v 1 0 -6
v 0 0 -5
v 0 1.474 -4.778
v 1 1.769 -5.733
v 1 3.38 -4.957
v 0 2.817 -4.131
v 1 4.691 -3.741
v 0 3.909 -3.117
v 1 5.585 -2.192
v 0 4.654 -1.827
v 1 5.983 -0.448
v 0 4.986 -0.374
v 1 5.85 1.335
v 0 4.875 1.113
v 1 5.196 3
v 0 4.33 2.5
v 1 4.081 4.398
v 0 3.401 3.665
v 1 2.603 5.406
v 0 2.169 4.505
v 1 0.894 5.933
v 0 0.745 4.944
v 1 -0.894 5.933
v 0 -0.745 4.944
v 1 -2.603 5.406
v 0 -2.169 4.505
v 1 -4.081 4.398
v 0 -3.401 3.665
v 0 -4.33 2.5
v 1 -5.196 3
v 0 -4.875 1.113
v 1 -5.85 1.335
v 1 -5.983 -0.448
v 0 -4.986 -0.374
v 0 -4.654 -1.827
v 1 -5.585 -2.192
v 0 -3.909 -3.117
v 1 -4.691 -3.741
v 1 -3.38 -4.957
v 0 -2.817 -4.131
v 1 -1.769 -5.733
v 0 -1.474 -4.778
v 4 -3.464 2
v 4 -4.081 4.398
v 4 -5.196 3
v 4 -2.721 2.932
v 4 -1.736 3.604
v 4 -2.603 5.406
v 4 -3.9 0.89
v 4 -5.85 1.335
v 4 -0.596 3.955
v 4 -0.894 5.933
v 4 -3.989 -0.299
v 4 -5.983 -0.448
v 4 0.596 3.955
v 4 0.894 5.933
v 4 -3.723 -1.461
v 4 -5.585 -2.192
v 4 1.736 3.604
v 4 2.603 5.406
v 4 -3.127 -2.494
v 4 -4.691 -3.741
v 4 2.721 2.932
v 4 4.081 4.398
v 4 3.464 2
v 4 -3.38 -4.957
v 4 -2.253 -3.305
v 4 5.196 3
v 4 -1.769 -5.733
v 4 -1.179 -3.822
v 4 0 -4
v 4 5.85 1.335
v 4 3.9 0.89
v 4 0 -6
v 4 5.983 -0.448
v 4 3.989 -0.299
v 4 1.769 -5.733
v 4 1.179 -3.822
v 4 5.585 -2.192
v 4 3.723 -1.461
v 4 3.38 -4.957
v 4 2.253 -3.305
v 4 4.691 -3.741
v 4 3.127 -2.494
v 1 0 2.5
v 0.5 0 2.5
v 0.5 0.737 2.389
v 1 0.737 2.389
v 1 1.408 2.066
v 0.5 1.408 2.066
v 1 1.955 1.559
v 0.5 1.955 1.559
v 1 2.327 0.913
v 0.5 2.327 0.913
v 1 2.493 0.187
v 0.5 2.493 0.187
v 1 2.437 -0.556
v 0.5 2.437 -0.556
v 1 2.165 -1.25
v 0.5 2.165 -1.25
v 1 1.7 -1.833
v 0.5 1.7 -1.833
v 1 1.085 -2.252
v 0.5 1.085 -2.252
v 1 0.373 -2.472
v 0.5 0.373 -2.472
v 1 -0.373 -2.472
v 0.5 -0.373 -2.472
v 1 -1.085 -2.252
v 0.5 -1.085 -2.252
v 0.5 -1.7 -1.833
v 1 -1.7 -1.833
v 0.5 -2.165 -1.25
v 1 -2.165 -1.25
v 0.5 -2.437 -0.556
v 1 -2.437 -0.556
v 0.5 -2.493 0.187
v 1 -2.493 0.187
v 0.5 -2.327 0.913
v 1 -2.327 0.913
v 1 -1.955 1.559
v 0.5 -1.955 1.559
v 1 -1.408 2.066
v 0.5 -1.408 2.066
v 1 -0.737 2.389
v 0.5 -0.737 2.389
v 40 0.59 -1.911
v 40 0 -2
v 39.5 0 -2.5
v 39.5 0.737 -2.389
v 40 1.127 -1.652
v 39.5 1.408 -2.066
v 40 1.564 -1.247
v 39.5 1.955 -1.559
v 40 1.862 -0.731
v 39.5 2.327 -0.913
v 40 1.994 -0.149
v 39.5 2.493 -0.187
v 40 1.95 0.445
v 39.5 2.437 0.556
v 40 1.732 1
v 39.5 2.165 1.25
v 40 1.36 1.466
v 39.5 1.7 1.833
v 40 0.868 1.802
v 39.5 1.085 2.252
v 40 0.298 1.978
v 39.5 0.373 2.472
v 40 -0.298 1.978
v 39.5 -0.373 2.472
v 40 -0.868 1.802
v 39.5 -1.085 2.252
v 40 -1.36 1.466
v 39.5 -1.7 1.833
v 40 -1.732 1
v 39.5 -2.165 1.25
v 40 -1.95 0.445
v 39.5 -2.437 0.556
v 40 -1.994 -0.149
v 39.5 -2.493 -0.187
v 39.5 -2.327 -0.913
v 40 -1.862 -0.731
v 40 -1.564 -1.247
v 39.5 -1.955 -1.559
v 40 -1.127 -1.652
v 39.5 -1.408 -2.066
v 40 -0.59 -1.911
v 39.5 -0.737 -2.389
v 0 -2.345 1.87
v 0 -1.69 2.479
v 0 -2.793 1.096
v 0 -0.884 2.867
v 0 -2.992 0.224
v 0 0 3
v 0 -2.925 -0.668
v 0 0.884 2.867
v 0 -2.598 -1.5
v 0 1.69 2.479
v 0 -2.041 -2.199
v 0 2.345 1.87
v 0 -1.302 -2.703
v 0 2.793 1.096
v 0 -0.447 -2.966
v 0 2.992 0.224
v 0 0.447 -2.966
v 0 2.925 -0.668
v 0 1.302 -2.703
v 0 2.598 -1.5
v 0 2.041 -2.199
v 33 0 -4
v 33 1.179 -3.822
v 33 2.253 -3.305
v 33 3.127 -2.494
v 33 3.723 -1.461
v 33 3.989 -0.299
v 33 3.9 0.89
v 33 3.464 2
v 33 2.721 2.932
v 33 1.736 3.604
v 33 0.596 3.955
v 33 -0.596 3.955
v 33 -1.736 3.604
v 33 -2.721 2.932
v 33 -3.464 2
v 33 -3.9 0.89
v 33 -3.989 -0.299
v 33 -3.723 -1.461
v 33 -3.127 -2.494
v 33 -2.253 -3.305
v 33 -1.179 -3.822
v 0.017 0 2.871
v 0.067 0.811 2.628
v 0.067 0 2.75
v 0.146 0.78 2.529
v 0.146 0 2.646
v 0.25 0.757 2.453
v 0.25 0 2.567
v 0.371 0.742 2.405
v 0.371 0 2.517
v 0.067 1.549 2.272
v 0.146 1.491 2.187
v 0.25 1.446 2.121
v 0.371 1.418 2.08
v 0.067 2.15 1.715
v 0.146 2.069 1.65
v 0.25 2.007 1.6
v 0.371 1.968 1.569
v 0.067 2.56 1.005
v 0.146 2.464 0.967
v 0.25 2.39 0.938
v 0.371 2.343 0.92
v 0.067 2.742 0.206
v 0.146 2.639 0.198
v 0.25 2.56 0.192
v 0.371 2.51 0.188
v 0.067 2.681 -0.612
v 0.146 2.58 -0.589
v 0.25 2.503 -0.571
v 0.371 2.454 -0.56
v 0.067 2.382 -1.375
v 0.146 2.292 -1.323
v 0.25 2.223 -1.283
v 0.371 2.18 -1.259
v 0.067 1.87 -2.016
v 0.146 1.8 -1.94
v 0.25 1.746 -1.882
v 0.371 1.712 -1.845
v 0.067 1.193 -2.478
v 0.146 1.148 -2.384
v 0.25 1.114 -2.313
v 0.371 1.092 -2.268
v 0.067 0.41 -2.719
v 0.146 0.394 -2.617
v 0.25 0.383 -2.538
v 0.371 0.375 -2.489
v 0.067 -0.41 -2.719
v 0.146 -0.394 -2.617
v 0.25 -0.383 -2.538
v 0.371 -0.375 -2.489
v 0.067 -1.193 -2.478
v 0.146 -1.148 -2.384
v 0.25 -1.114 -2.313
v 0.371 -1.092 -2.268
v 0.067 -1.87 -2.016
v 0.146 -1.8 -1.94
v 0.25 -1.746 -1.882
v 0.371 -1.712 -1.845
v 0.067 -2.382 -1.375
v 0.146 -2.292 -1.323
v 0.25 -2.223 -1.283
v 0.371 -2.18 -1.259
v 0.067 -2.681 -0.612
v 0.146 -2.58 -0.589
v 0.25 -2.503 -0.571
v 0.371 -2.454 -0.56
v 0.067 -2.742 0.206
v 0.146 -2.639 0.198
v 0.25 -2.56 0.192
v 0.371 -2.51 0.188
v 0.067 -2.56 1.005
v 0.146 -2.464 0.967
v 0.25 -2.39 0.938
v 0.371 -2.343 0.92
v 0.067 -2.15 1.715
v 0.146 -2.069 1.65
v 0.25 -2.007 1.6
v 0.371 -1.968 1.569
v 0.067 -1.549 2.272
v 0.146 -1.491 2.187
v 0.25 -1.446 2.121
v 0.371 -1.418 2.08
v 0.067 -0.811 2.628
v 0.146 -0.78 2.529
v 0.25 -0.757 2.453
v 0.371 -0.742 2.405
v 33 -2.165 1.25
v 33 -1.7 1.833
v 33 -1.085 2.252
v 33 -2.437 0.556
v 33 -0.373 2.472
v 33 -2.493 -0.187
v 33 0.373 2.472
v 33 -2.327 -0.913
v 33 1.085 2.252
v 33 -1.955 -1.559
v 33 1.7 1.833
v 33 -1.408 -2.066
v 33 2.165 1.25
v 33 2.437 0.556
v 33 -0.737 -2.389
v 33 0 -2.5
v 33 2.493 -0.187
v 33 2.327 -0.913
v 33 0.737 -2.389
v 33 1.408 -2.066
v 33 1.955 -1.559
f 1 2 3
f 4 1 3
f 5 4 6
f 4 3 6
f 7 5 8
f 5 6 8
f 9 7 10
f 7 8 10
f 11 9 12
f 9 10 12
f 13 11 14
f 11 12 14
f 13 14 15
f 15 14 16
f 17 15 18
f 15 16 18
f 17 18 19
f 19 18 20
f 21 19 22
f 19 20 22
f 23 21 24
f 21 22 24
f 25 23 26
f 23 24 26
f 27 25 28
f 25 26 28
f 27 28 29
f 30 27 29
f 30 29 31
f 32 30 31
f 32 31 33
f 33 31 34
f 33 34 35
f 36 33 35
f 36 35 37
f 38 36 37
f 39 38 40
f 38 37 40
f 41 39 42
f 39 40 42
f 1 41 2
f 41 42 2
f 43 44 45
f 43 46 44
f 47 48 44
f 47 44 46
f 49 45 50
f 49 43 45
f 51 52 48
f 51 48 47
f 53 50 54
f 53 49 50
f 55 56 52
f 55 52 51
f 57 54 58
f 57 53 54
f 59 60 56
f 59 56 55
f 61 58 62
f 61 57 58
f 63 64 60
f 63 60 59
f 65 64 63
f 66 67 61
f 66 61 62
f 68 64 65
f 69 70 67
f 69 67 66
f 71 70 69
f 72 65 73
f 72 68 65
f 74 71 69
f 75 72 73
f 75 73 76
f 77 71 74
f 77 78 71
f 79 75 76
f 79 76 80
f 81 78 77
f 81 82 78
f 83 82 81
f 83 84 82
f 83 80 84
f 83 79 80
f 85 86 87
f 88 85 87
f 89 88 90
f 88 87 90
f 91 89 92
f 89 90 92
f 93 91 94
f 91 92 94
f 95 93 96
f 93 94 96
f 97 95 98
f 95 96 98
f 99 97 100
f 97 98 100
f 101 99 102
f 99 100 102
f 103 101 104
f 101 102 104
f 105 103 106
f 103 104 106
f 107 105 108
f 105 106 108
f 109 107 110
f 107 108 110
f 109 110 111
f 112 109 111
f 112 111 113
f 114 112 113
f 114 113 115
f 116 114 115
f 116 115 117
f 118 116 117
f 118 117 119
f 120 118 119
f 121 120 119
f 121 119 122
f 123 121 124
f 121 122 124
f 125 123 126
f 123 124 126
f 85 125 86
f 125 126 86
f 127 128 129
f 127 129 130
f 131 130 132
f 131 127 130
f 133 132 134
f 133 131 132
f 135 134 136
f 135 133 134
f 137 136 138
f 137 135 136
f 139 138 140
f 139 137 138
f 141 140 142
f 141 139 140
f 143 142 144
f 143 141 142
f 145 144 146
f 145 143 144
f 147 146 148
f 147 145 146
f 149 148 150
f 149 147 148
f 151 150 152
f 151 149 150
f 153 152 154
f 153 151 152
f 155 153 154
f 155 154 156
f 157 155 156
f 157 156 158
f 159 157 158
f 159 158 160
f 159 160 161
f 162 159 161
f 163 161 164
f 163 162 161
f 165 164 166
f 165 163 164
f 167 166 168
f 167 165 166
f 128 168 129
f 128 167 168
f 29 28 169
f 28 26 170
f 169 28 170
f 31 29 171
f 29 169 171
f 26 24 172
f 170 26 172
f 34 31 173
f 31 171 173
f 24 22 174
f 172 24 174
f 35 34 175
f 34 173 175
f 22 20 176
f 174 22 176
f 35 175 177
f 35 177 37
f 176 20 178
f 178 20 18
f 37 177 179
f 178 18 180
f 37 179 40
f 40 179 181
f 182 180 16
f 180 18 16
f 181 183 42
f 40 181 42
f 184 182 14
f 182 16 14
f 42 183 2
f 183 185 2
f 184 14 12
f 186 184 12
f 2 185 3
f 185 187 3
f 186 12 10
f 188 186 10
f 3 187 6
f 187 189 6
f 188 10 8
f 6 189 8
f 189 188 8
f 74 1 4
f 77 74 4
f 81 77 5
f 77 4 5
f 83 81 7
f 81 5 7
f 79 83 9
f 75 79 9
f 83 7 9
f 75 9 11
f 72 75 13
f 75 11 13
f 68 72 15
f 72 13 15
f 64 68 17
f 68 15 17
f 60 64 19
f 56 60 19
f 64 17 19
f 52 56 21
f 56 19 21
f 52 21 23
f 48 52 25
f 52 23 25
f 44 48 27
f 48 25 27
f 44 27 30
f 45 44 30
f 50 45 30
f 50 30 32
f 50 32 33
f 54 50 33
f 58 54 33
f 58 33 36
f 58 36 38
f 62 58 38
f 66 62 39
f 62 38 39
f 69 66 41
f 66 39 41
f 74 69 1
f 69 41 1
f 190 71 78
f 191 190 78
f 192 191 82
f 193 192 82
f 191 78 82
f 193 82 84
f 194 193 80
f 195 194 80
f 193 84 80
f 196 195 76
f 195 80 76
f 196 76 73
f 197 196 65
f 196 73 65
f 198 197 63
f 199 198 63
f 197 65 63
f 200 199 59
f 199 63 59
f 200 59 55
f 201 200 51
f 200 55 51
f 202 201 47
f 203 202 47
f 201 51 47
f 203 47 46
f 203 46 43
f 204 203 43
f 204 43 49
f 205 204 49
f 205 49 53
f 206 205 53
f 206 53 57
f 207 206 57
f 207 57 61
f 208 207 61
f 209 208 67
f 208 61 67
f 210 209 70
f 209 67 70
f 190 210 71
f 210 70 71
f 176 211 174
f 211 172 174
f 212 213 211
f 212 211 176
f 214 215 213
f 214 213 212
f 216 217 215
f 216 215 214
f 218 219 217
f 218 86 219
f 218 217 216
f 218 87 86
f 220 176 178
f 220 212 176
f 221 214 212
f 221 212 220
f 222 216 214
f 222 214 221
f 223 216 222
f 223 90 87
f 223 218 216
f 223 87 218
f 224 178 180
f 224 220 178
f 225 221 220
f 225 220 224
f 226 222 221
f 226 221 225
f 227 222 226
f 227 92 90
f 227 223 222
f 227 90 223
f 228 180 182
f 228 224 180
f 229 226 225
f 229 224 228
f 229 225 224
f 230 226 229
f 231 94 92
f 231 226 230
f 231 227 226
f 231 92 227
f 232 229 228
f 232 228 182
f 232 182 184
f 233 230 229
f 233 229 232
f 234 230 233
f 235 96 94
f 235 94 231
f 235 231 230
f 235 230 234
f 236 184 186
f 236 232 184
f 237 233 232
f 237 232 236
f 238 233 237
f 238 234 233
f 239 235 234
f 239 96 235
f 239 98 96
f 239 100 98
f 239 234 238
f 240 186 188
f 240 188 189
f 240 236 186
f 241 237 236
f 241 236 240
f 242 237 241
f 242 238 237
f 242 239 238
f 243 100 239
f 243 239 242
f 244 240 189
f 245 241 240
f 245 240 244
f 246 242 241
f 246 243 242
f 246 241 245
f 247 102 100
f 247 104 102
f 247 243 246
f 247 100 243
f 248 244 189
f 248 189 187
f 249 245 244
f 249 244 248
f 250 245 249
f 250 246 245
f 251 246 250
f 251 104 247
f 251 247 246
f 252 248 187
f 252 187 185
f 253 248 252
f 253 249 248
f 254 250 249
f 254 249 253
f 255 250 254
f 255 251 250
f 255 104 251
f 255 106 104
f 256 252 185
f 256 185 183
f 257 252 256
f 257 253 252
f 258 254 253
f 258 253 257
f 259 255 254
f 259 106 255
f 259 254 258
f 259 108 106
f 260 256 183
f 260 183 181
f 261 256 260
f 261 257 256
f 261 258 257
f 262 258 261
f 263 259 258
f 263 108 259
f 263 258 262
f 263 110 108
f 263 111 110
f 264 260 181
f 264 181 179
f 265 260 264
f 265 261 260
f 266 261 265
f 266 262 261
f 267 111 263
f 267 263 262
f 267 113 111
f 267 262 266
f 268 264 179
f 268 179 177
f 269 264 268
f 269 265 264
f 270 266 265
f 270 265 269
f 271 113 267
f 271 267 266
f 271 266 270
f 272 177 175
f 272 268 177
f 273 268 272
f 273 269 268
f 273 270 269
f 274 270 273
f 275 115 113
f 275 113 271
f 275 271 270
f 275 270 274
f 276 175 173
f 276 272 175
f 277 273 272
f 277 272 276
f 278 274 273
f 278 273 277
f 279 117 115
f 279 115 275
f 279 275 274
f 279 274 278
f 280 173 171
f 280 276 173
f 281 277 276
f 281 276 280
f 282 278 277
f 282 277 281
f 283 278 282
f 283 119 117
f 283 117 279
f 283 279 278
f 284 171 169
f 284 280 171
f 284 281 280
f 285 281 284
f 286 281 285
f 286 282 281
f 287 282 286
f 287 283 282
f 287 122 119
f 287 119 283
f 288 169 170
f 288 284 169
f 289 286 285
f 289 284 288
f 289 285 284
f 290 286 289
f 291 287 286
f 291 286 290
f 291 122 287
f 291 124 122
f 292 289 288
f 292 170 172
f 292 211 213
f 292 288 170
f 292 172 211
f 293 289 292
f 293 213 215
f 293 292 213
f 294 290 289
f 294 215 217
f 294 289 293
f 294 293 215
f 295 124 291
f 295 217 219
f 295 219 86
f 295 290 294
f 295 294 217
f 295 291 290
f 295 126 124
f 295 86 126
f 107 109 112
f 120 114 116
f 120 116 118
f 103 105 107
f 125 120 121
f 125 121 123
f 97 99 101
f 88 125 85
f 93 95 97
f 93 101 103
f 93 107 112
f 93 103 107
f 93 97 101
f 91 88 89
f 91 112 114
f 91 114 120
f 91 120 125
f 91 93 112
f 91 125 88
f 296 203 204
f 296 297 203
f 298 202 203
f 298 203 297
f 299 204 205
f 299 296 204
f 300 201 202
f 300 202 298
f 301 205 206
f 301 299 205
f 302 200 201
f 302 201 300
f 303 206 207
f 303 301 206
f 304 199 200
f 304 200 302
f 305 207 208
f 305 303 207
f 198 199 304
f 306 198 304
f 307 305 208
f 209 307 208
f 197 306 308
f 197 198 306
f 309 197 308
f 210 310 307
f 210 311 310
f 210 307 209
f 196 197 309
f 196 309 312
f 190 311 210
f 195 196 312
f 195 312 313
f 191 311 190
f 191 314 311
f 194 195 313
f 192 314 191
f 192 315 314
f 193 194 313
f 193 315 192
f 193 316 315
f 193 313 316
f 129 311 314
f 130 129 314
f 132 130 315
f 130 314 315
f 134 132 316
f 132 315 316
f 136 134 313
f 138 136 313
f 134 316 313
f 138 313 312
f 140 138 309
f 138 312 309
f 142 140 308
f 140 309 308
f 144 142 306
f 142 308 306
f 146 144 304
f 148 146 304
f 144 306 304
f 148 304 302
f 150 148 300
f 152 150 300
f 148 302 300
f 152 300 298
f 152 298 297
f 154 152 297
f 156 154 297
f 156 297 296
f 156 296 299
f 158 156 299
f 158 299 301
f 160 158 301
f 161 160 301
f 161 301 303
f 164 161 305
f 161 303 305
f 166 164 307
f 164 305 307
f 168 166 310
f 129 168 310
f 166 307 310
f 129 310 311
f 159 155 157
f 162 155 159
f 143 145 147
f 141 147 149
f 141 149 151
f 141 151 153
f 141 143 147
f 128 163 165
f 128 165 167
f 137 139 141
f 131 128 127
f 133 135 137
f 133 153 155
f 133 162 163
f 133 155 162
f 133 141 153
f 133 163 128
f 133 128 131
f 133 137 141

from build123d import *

# Parameters (mm, degrees)
SKETCH1_R           = 6
BOSS_EXTRUDE1_DEPTH = 4
SKETCH2_R           = 4
BOSS_EXTRUDE2_DEPTH = 29
SKETCH3_R           = 2.5
BOSS_EXTRUDE3_DEPTH = 7
CHAMFER1_SIZE       = 0.5
CHAMFER2_SIZE       = 1
SKETCH4_R           = 2.5
CUT_EXTRUDE1_DEPTH  = 1
FILLET1_R           = 0.5


with BuildPart() as part:
    # Sketch1 → Boss-Extrude1 (new body)
    with BuildSketch(Plane(origin=(0, 0, 0), x_dir=(0, 0, -1), z_dir=(1, 0, 0))):
        Circle(SKETCH1_R)
    extrude(amount=BOSS_EXTRUDE1_DEPTH)

    # Sketch2 → Boss-Extrude2 (add)
    with BuildSketch(Plane(origin=(4, 0, 0), x_dir=(0, 0, -1), z_dir=(1, 0, 0))):
        Circle(SKETCH2_R)
    extrude(amount=BOSS_EXTRUDE2_DEPTH)

    # Sketch3 → Boss-Extrude3 (add)
    with BuildSketch(Plane(origin=(33, 0, 0), x_dir=(0, 0, -1), z_dir=(1, 0, 0))):
        Circle(SKETCH3_R)
    extrude(amount=BOSS_EXTRUDE3_DEPTH)

    # Chamfer1
    chamfer1_edges = [part.edges().sort_by_distance(p)[0] for p in [
        (40, 0, 2.5),
    ]]
    chamfer(chamfer1_edges, length=CHAMFER1_SIZE)

    # Chamfer2
    chamfer2_edges = [part.edges().sort_by_distance(p)[0] for p in [
        (0, 0, 6),
    ]]
    chamfer(chamfer2_edges, length=CHAMFER2_SIZE)

    # Sketch4 → Cut-Extrude1 (cut)
    with BuildSketch(Plane.ZY):
        Circle(SKETCH4_R)
    extrude(amount=-CUT_EXTRUDE1_DEPTH, mode=Mode.SUBTRACT)

    # Fillet1
    fillet1_edges = [part.edges().sort_by_distance(p)[0] for p in [
        (0, 0, -2.5),
    ]]
    fillet(fillet1_edges, radius=FILLET1_R)


solid = part.part
